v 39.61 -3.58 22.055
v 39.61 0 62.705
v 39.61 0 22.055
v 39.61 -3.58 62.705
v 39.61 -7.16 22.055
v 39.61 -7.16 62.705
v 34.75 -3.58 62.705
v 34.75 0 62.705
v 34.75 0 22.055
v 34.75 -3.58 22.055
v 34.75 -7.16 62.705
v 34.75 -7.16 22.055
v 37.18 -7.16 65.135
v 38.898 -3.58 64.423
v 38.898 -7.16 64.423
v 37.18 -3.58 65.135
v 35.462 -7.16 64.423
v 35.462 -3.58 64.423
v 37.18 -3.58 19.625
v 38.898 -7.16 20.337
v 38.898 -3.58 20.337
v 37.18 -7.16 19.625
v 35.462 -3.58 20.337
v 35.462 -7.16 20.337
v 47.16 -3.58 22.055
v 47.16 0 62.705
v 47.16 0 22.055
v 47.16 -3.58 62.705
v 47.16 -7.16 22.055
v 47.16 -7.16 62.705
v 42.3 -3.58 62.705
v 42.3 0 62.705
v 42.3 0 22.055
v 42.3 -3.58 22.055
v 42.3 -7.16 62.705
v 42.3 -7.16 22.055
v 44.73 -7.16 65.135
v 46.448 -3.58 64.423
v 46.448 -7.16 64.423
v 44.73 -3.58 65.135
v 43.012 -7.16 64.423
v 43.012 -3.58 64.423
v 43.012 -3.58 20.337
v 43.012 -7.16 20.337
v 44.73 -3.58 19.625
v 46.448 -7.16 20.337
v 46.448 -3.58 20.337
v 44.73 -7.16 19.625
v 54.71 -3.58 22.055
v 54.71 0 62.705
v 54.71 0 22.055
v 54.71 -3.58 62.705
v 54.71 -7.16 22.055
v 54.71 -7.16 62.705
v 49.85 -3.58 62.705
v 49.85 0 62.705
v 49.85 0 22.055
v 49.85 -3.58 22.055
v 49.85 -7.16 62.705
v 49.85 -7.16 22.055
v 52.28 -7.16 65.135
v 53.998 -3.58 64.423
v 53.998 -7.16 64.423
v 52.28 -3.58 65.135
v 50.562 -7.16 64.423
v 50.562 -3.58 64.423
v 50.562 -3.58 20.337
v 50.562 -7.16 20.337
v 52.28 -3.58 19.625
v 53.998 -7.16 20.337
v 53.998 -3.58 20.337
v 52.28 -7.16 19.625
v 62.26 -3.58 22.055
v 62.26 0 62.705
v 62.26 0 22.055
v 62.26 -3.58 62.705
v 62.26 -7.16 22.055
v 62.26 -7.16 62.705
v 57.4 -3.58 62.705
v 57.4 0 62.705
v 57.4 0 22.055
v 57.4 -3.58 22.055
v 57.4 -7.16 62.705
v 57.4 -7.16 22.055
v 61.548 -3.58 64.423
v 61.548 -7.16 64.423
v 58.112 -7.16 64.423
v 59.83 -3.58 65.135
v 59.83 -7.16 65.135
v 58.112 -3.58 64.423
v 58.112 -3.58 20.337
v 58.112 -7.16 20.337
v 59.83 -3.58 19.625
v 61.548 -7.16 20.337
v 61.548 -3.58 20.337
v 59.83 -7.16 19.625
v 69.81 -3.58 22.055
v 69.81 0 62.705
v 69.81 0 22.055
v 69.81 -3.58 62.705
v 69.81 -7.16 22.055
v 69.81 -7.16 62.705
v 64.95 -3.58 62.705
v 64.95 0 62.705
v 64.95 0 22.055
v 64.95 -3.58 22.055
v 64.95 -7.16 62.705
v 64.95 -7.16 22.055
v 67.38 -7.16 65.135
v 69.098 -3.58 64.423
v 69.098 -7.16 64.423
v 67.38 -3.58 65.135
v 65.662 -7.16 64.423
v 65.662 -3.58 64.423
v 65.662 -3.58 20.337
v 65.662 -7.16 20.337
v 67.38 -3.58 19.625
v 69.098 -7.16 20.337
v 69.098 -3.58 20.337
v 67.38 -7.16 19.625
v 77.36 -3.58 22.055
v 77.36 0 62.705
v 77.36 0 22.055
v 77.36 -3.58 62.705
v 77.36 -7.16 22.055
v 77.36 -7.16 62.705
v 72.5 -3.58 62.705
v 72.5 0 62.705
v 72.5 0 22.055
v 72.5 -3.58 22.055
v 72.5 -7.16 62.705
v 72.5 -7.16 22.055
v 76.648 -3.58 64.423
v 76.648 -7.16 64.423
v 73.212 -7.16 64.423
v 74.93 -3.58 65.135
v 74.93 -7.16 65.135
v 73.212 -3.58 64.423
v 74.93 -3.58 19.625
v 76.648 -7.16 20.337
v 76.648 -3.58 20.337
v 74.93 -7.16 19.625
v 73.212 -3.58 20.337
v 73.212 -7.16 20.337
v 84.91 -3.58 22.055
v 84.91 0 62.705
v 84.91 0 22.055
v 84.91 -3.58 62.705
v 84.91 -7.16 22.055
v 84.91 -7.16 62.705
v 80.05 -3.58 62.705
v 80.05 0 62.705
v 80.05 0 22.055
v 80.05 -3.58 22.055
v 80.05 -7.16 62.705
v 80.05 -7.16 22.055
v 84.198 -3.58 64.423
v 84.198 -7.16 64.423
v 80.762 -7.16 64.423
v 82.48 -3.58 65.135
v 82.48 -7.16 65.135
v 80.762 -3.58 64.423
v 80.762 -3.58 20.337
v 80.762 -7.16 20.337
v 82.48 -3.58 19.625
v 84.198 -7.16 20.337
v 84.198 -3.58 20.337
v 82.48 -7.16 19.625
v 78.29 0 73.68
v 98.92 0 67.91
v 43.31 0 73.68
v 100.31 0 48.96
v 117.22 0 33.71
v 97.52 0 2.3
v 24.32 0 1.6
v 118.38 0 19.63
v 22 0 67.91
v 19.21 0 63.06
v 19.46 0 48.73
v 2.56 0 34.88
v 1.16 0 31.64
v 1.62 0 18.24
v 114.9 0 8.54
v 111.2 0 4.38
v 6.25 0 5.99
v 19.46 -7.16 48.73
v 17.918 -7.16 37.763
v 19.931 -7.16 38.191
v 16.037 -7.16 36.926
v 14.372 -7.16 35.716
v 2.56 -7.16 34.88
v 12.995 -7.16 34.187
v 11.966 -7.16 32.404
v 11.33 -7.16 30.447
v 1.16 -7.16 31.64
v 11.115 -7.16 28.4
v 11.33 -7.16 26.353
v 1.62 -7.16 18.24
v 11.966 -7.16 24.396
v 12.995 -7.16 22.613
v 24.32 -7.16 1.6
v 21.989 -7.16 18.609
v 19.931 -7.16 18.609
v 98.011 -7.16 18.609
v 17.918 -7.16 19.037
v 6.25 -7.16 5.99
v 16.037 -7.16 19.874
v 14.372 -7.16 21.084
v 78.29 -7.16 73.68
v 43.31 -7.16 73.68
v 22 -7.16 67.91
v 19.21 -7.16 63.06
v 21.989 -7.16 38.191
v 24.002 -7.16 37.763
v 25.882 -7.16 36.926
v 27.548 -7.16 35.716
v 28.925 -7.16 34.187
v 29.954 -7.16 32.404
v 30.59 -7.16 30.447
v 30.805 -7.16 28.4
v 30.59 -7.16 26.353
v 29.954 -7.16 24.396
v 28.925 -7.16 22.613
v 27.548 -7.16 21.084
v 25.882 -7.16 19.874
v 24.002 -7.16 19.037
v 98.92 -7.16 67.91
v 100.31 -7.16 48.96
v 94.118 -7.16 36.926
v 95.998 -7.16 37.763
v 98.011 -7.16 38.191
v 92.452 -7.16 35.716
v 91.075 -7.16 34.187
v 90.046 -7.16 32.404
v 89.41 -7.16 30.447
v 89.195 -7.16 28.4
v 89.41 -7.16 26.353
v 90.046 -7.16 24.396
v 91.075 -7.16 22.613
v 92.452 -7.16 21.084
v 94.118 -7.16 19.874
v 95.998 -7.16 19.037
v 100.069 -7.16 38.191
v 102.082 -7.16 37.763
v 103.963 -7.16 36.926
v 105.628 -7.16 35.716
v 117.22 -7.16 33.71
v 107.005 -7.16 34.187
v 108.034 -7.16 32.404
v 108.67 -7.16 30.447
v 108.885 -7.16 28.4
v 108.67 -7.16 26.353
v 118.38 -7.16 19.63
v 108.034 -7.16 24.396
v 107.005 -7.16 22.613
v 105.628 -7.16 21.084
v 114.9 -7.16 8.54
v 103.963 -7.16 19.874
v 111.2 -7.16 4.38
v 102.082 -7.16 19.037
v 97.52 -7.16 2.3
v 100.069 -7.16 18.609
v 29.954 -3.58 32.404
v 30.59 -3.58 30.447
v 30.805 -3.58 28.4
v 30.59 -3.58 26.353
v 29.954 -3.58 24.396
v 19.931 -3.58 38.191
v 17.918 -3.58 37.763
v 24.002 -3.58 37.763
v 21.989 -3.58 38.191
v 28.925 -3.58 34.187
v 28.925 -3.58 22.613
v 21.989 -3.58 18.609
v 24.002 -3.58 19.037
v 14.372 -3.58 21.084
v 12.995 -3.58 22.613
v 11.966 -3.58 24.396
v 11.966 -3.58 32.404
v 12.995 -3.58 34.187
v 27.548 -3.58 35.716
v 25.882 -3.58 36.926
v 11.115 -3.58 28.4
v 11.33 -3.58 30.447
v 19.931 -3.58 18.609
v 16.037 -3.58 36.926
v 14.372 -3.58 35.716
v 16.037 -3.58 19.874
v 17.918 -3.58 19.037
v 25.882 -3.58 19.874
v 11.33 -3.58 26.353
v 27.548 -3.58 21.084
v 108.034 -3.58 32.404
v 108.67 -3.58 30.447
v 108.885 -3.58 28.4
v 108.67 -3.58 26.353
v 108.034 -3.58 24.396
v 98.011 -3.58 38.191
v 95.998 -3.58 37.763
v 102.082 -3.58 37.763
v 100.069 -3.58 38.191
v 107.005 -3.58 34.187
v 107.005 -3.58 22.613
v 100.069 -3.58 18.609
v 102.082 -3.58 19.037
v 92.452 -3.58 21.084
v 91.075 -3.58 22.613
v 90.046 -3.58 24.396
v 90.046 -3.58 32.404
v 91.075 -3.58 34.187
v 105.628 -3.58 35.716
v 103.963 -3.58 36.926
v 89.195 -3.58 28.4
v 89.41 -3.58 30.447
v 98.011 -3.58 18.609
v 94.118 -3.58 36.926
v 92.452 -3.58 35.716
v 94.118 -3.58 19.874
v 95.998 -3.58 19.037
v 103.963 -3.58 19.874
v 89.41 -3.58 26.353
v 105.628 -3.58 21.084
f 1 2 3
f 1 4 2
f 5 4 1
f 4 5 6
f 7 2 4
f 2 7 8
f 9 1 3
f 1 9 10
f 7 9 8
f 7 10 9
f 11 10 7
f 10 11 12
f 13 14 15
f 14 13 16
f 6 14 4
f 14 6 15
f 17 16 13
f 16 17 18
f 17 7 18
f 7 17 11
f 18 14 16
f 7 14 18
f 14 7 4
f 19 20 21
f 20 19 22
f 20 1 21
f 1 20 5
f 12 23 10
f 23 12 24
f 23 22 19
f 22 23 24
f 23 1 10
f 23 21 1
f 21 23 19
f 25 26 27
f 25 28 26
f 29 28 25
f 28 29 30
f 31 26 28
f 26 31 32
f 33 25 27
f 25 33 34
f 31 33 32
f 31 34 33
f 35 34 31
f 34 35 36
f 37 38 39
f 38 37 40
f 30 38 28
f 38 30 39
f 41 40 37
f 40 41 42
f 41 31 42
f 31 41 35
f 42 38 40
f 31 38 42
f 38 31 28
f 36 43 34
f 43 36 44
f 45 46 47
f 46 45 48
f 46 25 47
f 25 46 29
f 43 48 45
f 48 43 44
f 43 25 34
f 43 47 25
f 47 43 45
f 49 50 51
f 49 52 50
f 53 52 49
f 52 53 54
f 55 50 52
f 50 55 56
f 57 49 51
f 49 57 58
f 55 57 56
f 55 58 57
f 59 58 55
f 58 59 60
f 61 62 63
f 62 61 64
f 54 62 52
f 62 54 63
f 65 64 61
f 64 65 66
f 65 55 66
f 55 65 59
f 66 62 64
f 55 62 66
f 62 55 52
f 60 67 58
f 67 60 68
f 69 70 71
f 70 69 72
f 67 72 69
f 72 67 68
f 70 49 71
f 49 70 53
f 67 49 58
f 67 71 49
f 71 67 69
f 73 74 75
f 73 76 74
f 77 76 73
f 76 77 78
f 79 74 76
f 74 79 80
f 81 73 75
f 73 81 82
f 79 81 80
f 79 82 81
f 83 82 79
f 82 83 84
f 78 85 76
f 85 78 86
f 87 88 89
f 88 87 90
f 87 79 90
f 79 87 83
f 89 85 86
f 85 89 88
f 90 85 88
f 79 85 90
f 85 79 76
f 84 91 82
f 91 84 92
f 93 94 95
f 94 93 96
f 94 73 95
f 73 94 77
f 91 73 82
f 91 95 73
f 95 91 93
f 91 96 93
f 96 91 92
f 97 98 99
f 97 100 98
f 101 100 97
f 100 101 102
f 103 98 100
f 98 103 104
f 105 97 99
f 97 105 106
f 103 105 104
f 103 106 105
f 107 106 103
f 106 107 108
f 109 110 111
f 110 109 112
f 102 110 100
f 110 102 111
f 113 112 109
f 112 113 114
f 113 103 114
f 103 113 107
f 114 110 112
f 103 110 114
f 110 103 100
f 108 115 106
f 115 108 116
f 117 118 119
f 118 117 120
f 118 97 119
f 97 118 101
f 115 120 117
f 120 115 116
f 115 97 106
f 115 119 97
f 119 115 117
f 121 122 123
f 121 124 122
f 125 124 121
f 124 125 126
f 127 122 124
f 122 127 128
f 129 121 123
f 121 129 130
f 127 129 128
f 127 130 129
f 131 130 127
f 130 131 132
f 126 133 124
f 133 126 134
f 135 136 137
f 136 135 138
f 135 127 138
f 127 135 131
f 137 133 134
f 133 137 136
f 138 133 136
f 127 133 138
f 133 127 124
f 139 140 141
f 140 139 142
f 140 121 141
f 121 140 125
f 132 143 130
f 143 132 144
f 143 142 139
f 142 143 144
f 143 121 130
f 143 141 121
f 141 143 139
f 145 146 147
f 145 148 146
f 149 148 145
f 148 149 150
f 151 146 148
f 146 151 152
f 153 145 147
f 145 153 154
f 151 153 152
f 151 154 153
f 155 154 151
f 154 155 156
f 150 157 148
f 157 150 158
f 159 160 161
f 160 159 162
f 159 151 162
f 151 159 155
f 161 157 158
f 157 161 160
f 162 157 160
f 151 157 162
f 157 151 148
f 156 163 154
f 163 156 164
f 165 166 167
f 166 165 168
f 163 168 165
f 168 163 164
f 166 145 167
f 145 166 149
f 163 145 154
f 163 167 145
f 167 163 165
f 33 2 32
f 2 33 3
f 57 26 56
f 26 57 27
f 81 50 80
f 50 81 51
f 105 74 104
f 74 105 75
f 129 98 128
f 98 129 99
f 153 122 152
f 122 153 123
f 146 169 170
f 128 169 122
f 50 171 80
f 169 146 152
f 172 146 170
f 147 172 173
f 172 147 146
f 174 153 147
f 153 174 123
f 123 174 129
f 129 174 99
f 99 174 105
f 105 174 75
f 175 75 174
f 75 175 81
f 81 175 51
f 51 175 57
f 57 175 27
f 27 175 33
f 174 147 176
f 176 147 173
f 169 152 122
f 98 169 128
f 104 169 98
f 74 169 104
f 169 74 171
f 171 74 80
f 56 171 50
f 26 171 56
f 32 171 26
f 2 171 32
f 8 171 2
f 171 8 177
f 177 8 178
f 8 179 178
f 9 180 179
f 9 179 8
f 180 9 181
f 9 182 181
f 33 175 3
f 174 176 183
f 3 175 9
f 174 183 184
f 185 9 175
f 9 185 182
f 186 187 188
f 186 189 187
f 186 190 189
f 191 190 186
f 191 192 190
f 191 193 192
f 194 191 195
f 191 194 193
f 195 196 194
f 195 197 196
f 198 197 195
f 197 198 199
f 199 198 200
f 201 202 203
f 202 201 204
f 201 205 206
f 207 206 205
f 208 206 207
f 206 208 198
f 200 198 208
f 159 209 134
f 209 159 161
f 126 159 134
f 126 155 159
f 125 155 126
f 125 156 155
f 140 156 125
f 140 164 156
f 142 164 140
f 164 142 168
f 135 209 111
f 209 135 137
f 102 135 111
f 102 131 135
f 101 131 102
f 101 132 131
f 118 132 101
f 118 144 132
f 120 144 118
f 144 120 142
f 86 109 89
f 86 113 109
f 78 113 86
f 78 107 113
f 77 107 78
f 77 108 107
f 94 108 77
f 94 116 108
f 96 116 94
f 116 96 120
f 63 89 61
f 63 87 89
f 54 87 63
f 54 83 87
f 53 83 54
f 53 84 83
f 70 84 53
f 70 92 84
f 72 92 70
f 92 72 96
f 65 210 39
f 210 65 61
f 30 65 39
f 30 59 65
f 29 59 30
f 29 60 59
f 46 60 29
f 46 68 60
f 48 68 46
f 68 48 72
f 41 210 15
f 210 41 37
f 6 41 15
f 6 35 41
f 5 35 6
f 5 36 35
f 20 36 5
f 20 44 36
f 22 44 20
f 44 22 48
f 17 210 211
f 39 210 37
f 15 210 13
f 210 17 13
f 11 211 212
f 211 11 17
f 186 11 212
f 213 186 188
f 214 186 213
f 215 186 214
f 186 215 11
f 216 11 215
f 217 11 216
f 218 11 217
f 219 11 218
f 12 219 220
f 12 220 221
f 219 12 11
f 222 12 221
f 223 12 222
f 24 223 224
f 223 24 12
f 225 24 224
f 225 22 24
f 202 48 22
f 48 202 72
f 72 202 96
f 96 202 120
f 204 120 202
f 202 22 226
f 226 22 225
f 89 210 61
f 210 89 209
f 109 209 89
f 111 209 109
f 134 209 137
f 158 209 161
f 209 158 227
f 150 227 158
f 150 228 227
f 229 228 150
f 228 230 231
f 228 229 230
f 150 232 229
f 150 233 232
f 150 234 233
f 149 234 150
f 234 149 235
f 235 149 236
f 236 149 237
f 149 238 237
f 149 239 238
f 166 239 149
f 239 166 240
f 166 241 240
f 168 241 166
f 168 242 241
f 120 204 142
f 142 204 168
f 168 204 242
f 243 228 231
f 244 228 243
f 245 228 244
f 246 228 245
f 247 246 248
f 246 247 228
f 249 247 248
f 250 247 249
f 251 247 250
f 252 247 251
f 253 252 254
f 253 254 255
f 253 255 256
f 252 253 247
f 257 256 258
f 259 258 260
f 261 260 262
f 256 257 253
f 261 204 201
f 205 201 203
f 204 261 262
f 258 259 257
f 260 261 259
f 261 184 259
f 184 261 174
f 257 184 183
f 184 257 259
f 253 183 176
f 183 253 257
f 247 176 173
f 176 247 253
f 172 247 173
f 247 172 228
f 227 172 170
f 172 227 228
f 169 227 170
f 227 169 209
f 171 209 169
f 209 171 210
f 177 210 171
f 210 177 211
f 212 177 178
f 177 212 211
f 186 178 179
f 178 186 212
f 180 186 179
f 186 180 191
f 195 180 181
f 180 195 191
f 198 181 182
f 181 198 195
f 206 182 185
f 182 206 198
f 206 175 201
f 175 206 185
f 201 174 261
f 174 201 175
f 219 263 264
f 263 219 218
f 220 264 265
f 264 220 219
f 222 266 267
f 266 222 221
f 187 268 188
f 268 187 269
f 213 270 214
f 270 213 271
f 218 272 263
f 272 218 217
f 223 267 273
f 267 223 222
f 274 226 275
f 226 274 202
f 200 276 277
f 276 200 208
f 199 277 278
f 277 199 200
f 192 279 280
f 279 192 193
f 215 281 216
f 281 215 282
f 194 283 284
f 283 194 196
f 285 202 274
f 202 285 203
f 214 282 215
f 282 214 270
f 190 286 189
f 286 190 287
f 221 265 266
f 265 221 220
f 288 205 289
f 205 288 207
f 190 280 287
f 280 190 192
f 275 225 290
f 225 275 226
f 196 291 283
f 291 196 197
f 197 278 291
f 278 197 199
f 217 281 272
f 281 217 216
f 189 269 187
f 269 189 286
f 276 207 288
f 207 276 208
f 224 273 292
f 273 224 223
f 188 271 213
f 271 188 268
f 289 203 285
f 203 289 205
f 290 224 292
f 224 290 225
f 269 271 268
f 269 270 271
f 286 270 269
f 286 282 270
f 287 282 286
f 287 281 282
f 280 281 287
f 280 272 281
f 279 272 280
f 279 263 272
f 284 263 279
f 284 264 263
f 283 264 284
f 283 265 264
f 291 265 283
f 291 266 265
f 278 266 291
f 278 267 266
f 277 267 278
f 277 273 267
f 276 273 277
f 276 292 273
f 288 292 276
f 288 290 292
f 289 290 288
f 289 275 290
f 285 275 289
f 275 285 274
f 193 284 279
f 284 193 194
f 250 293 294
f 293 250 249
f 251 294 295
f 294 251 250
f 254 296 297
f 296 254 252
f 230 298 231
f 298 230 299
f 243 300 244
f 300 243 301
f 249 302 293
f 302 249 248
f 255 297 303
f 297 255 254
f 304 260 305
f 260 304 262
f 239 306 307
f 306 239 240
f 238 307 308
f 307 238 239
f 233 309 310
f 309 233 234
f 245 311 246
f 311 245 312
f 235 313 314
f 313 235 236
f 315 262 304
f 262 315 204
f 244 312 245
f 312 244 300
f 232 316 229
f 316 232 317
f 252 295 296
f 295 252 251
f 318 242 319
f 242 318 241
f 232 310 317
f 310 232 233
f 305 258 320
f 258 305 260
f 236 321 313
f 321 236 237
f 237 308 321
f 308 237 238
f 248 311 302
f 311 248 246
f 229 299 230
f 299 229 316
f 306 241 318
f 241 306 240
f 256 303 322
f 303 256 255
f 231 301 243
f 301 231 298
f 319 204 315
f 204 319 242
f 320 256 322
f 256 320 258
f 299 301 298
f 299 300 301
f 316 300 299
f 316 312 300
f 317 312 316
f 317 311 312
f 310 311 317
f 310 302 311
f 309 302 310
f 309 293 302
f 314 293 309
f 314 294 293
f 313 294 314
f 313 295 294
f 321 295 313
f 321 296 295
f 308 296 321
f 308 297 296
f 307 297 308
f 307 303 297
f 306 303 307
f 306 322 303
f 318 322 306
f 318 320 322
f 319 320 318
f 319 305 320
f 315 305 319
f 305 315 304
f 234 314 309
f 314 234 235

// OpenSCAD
/* doodle-meta {"version":1,"parameters":{"width":{"label":"Overall width","description":"Changes the body width","unit":"mm","feature":"body_width"},"height":{"label":"Overall height","description":"Changes the body height","unit":"mm","feature":"body_height"},"depth":{"label":"Overall depth","description":"Changes the body depth","unit":"mm","feature":"body_depth"},"slot_width":{"label":"Slot width","description":"Changes the width of the grille slots","unit":"mm","feature":"grille_slots"},"slot_height":{"label":"Slot height","description":"Changes the height of the grille slots","unit":"mm","feature":"grille_slots"},"headlight_diameter":{"label":"Headlight diameter","description":"Changes the diameter of the headlight openings","unit":"mm","feature":"headlights"}},"features":{"body_width":{"kind":"dimension","axis":"x","label":"Overall width"},"body_height":{"kind":"dimension","axis":"z","label":"Overall height"},"body_depth":{"kind":"dimension","axis":"y","label":"Overall depth"},"grille_slots":{"kind":"region","label":"Grille Slots","min":[34.75,0,19.61],"max":[85.0,7.16,65.15]},"headlights":{"kind":"region","label":"Headlights","min":[11.11,0,18.12],"max":[108.89,7.16,38.68]}}} */

// Top-level parameters (user-editable)
width = 120.0;
height = 75.07;
depth = 7.16;
slot_width = 4.86;
slot_height = 45.51;
headlight_diameter = 19.69;

// Derived constants (not user-editable)
eps = 0.01;
slot_count = 7;
slot_pitch = 7.55;
slot_start_x = 37.18;
slot_center_z = 42.38;
headlight_left_x = 20.96;
headlight_right_x = 99.04;
headlight_center_z = 28.4;

// Outer profile polygon in XZ plane (front view)
// Coordinates from feature_placements_mm contour_0
module grille_body() {
    polygon([
        [1.16, 31.64],
        [1.62, 18.24],
        [6.25, 5.99],
        [24.32, 1.6],
        [97.52, 2.3],
        [111.2, 4.38],
        [114.9, 8.54],
        [118.38, 19.63],
        [117.22, 33.71],
        [100.31, 48.96],
        [98.92, 67.91],
        [78.29, 73.68],
        [43.31, 73.68],
        [22.0, 67.91],
        [19.21, 63.06],
        [19.46, 48.73],
        [2.56, 34.88]
    ]);
}

// Slot cutter: stadium shape (rectangle with half-round ends)
// Cut along Y axis (through the front face)
// Note: The body is rotated [90,0,0] then extruded along Z.
// This maps the 2D polygon (x, z) to 3D (x, -z, y_extrude).
// To cut through the body along Y, we need cutters that span the Y range of the body.
// The body spans Y from -height to 0 (due to rotation and extrusion).
// We define cutters in the same coordinate system as the body BEFORE rotation? 
// No, the difference() is applied to the rotated body.
// So cutters must be in the final world coordinates.
// World coords: X is width, Y is depth (0 to depth), Z is height (0 to height).
// Wait, let's re-verify the body transform.
// rotate([90,0,0]) linear_extrude(height=depth) polygon(x,z)
// Polygon point (px, pz) -> 3D (px, pz, 0) -> Extrude -> (px, pz, y) for y in [0, depth]
// Rotate 90 about X: (x, y, z) -> (x, -z, y)
// So (px, pz, y) -> (px, -y, pz)
// The body occupies X in [min_px, max_px], Y in [-depth, 0], Z in [min_pz, max_pz].
// The cutters need to span Y from -depth-eps to eps.
// And be positioned at correct X and Z.

module slot_cutter(x, z, w, h) {
    // Rectangle part
    translate([x - w/2, -depth - eps, z - h/2 + w/2])
        cube([w, depth + 2*eps, h - w]);
    // Top half-circle
    translate([x, -depth - eps, z + h/2 - w/2])
        rotate([90, 0, 0])
            cylinder(h = depth + 2*eps, r = w/2, center = true);
    // Bottom half-circle
    translate([x, -depth - eps, z - h/2 + w/2])
        rotate([90, 0, 0])
            cylinder(h = depth + 2*eps, r = w/2, center = true);
}

// Headlight cutter: cylinder cut along Y axis
module headlight_cutter(x, z, d) {
    translate([x, -depth - eps, z])
        rotate([90, 0, 0])
            cylinder(h = depth + 2*eps, d = d, center = true);
}

// Main design
difference() {
    // Positive body: extrude front profile along Y
    rotate([90, 0, 0])
        linear_extrude(height = depth)
            grille_body();
    
    // Subtract grille slots (7 vertical slots)
    for (i = [0:slot_count-1]) {
        slot_x = slot_start_x + i * slot_pitch;
        slot_cutter(slot_x, slot_center_z, slot_width, slot_height);
    }
    
    // Subtract left headlight
    headlight_cutter(headlight_left_x, headlight_center_z, headlight_diameter);
    
    // Subtract right headlight
    headlight_cutter(headlight_right_x, headlight_center_z, headlight_diameter);
}
